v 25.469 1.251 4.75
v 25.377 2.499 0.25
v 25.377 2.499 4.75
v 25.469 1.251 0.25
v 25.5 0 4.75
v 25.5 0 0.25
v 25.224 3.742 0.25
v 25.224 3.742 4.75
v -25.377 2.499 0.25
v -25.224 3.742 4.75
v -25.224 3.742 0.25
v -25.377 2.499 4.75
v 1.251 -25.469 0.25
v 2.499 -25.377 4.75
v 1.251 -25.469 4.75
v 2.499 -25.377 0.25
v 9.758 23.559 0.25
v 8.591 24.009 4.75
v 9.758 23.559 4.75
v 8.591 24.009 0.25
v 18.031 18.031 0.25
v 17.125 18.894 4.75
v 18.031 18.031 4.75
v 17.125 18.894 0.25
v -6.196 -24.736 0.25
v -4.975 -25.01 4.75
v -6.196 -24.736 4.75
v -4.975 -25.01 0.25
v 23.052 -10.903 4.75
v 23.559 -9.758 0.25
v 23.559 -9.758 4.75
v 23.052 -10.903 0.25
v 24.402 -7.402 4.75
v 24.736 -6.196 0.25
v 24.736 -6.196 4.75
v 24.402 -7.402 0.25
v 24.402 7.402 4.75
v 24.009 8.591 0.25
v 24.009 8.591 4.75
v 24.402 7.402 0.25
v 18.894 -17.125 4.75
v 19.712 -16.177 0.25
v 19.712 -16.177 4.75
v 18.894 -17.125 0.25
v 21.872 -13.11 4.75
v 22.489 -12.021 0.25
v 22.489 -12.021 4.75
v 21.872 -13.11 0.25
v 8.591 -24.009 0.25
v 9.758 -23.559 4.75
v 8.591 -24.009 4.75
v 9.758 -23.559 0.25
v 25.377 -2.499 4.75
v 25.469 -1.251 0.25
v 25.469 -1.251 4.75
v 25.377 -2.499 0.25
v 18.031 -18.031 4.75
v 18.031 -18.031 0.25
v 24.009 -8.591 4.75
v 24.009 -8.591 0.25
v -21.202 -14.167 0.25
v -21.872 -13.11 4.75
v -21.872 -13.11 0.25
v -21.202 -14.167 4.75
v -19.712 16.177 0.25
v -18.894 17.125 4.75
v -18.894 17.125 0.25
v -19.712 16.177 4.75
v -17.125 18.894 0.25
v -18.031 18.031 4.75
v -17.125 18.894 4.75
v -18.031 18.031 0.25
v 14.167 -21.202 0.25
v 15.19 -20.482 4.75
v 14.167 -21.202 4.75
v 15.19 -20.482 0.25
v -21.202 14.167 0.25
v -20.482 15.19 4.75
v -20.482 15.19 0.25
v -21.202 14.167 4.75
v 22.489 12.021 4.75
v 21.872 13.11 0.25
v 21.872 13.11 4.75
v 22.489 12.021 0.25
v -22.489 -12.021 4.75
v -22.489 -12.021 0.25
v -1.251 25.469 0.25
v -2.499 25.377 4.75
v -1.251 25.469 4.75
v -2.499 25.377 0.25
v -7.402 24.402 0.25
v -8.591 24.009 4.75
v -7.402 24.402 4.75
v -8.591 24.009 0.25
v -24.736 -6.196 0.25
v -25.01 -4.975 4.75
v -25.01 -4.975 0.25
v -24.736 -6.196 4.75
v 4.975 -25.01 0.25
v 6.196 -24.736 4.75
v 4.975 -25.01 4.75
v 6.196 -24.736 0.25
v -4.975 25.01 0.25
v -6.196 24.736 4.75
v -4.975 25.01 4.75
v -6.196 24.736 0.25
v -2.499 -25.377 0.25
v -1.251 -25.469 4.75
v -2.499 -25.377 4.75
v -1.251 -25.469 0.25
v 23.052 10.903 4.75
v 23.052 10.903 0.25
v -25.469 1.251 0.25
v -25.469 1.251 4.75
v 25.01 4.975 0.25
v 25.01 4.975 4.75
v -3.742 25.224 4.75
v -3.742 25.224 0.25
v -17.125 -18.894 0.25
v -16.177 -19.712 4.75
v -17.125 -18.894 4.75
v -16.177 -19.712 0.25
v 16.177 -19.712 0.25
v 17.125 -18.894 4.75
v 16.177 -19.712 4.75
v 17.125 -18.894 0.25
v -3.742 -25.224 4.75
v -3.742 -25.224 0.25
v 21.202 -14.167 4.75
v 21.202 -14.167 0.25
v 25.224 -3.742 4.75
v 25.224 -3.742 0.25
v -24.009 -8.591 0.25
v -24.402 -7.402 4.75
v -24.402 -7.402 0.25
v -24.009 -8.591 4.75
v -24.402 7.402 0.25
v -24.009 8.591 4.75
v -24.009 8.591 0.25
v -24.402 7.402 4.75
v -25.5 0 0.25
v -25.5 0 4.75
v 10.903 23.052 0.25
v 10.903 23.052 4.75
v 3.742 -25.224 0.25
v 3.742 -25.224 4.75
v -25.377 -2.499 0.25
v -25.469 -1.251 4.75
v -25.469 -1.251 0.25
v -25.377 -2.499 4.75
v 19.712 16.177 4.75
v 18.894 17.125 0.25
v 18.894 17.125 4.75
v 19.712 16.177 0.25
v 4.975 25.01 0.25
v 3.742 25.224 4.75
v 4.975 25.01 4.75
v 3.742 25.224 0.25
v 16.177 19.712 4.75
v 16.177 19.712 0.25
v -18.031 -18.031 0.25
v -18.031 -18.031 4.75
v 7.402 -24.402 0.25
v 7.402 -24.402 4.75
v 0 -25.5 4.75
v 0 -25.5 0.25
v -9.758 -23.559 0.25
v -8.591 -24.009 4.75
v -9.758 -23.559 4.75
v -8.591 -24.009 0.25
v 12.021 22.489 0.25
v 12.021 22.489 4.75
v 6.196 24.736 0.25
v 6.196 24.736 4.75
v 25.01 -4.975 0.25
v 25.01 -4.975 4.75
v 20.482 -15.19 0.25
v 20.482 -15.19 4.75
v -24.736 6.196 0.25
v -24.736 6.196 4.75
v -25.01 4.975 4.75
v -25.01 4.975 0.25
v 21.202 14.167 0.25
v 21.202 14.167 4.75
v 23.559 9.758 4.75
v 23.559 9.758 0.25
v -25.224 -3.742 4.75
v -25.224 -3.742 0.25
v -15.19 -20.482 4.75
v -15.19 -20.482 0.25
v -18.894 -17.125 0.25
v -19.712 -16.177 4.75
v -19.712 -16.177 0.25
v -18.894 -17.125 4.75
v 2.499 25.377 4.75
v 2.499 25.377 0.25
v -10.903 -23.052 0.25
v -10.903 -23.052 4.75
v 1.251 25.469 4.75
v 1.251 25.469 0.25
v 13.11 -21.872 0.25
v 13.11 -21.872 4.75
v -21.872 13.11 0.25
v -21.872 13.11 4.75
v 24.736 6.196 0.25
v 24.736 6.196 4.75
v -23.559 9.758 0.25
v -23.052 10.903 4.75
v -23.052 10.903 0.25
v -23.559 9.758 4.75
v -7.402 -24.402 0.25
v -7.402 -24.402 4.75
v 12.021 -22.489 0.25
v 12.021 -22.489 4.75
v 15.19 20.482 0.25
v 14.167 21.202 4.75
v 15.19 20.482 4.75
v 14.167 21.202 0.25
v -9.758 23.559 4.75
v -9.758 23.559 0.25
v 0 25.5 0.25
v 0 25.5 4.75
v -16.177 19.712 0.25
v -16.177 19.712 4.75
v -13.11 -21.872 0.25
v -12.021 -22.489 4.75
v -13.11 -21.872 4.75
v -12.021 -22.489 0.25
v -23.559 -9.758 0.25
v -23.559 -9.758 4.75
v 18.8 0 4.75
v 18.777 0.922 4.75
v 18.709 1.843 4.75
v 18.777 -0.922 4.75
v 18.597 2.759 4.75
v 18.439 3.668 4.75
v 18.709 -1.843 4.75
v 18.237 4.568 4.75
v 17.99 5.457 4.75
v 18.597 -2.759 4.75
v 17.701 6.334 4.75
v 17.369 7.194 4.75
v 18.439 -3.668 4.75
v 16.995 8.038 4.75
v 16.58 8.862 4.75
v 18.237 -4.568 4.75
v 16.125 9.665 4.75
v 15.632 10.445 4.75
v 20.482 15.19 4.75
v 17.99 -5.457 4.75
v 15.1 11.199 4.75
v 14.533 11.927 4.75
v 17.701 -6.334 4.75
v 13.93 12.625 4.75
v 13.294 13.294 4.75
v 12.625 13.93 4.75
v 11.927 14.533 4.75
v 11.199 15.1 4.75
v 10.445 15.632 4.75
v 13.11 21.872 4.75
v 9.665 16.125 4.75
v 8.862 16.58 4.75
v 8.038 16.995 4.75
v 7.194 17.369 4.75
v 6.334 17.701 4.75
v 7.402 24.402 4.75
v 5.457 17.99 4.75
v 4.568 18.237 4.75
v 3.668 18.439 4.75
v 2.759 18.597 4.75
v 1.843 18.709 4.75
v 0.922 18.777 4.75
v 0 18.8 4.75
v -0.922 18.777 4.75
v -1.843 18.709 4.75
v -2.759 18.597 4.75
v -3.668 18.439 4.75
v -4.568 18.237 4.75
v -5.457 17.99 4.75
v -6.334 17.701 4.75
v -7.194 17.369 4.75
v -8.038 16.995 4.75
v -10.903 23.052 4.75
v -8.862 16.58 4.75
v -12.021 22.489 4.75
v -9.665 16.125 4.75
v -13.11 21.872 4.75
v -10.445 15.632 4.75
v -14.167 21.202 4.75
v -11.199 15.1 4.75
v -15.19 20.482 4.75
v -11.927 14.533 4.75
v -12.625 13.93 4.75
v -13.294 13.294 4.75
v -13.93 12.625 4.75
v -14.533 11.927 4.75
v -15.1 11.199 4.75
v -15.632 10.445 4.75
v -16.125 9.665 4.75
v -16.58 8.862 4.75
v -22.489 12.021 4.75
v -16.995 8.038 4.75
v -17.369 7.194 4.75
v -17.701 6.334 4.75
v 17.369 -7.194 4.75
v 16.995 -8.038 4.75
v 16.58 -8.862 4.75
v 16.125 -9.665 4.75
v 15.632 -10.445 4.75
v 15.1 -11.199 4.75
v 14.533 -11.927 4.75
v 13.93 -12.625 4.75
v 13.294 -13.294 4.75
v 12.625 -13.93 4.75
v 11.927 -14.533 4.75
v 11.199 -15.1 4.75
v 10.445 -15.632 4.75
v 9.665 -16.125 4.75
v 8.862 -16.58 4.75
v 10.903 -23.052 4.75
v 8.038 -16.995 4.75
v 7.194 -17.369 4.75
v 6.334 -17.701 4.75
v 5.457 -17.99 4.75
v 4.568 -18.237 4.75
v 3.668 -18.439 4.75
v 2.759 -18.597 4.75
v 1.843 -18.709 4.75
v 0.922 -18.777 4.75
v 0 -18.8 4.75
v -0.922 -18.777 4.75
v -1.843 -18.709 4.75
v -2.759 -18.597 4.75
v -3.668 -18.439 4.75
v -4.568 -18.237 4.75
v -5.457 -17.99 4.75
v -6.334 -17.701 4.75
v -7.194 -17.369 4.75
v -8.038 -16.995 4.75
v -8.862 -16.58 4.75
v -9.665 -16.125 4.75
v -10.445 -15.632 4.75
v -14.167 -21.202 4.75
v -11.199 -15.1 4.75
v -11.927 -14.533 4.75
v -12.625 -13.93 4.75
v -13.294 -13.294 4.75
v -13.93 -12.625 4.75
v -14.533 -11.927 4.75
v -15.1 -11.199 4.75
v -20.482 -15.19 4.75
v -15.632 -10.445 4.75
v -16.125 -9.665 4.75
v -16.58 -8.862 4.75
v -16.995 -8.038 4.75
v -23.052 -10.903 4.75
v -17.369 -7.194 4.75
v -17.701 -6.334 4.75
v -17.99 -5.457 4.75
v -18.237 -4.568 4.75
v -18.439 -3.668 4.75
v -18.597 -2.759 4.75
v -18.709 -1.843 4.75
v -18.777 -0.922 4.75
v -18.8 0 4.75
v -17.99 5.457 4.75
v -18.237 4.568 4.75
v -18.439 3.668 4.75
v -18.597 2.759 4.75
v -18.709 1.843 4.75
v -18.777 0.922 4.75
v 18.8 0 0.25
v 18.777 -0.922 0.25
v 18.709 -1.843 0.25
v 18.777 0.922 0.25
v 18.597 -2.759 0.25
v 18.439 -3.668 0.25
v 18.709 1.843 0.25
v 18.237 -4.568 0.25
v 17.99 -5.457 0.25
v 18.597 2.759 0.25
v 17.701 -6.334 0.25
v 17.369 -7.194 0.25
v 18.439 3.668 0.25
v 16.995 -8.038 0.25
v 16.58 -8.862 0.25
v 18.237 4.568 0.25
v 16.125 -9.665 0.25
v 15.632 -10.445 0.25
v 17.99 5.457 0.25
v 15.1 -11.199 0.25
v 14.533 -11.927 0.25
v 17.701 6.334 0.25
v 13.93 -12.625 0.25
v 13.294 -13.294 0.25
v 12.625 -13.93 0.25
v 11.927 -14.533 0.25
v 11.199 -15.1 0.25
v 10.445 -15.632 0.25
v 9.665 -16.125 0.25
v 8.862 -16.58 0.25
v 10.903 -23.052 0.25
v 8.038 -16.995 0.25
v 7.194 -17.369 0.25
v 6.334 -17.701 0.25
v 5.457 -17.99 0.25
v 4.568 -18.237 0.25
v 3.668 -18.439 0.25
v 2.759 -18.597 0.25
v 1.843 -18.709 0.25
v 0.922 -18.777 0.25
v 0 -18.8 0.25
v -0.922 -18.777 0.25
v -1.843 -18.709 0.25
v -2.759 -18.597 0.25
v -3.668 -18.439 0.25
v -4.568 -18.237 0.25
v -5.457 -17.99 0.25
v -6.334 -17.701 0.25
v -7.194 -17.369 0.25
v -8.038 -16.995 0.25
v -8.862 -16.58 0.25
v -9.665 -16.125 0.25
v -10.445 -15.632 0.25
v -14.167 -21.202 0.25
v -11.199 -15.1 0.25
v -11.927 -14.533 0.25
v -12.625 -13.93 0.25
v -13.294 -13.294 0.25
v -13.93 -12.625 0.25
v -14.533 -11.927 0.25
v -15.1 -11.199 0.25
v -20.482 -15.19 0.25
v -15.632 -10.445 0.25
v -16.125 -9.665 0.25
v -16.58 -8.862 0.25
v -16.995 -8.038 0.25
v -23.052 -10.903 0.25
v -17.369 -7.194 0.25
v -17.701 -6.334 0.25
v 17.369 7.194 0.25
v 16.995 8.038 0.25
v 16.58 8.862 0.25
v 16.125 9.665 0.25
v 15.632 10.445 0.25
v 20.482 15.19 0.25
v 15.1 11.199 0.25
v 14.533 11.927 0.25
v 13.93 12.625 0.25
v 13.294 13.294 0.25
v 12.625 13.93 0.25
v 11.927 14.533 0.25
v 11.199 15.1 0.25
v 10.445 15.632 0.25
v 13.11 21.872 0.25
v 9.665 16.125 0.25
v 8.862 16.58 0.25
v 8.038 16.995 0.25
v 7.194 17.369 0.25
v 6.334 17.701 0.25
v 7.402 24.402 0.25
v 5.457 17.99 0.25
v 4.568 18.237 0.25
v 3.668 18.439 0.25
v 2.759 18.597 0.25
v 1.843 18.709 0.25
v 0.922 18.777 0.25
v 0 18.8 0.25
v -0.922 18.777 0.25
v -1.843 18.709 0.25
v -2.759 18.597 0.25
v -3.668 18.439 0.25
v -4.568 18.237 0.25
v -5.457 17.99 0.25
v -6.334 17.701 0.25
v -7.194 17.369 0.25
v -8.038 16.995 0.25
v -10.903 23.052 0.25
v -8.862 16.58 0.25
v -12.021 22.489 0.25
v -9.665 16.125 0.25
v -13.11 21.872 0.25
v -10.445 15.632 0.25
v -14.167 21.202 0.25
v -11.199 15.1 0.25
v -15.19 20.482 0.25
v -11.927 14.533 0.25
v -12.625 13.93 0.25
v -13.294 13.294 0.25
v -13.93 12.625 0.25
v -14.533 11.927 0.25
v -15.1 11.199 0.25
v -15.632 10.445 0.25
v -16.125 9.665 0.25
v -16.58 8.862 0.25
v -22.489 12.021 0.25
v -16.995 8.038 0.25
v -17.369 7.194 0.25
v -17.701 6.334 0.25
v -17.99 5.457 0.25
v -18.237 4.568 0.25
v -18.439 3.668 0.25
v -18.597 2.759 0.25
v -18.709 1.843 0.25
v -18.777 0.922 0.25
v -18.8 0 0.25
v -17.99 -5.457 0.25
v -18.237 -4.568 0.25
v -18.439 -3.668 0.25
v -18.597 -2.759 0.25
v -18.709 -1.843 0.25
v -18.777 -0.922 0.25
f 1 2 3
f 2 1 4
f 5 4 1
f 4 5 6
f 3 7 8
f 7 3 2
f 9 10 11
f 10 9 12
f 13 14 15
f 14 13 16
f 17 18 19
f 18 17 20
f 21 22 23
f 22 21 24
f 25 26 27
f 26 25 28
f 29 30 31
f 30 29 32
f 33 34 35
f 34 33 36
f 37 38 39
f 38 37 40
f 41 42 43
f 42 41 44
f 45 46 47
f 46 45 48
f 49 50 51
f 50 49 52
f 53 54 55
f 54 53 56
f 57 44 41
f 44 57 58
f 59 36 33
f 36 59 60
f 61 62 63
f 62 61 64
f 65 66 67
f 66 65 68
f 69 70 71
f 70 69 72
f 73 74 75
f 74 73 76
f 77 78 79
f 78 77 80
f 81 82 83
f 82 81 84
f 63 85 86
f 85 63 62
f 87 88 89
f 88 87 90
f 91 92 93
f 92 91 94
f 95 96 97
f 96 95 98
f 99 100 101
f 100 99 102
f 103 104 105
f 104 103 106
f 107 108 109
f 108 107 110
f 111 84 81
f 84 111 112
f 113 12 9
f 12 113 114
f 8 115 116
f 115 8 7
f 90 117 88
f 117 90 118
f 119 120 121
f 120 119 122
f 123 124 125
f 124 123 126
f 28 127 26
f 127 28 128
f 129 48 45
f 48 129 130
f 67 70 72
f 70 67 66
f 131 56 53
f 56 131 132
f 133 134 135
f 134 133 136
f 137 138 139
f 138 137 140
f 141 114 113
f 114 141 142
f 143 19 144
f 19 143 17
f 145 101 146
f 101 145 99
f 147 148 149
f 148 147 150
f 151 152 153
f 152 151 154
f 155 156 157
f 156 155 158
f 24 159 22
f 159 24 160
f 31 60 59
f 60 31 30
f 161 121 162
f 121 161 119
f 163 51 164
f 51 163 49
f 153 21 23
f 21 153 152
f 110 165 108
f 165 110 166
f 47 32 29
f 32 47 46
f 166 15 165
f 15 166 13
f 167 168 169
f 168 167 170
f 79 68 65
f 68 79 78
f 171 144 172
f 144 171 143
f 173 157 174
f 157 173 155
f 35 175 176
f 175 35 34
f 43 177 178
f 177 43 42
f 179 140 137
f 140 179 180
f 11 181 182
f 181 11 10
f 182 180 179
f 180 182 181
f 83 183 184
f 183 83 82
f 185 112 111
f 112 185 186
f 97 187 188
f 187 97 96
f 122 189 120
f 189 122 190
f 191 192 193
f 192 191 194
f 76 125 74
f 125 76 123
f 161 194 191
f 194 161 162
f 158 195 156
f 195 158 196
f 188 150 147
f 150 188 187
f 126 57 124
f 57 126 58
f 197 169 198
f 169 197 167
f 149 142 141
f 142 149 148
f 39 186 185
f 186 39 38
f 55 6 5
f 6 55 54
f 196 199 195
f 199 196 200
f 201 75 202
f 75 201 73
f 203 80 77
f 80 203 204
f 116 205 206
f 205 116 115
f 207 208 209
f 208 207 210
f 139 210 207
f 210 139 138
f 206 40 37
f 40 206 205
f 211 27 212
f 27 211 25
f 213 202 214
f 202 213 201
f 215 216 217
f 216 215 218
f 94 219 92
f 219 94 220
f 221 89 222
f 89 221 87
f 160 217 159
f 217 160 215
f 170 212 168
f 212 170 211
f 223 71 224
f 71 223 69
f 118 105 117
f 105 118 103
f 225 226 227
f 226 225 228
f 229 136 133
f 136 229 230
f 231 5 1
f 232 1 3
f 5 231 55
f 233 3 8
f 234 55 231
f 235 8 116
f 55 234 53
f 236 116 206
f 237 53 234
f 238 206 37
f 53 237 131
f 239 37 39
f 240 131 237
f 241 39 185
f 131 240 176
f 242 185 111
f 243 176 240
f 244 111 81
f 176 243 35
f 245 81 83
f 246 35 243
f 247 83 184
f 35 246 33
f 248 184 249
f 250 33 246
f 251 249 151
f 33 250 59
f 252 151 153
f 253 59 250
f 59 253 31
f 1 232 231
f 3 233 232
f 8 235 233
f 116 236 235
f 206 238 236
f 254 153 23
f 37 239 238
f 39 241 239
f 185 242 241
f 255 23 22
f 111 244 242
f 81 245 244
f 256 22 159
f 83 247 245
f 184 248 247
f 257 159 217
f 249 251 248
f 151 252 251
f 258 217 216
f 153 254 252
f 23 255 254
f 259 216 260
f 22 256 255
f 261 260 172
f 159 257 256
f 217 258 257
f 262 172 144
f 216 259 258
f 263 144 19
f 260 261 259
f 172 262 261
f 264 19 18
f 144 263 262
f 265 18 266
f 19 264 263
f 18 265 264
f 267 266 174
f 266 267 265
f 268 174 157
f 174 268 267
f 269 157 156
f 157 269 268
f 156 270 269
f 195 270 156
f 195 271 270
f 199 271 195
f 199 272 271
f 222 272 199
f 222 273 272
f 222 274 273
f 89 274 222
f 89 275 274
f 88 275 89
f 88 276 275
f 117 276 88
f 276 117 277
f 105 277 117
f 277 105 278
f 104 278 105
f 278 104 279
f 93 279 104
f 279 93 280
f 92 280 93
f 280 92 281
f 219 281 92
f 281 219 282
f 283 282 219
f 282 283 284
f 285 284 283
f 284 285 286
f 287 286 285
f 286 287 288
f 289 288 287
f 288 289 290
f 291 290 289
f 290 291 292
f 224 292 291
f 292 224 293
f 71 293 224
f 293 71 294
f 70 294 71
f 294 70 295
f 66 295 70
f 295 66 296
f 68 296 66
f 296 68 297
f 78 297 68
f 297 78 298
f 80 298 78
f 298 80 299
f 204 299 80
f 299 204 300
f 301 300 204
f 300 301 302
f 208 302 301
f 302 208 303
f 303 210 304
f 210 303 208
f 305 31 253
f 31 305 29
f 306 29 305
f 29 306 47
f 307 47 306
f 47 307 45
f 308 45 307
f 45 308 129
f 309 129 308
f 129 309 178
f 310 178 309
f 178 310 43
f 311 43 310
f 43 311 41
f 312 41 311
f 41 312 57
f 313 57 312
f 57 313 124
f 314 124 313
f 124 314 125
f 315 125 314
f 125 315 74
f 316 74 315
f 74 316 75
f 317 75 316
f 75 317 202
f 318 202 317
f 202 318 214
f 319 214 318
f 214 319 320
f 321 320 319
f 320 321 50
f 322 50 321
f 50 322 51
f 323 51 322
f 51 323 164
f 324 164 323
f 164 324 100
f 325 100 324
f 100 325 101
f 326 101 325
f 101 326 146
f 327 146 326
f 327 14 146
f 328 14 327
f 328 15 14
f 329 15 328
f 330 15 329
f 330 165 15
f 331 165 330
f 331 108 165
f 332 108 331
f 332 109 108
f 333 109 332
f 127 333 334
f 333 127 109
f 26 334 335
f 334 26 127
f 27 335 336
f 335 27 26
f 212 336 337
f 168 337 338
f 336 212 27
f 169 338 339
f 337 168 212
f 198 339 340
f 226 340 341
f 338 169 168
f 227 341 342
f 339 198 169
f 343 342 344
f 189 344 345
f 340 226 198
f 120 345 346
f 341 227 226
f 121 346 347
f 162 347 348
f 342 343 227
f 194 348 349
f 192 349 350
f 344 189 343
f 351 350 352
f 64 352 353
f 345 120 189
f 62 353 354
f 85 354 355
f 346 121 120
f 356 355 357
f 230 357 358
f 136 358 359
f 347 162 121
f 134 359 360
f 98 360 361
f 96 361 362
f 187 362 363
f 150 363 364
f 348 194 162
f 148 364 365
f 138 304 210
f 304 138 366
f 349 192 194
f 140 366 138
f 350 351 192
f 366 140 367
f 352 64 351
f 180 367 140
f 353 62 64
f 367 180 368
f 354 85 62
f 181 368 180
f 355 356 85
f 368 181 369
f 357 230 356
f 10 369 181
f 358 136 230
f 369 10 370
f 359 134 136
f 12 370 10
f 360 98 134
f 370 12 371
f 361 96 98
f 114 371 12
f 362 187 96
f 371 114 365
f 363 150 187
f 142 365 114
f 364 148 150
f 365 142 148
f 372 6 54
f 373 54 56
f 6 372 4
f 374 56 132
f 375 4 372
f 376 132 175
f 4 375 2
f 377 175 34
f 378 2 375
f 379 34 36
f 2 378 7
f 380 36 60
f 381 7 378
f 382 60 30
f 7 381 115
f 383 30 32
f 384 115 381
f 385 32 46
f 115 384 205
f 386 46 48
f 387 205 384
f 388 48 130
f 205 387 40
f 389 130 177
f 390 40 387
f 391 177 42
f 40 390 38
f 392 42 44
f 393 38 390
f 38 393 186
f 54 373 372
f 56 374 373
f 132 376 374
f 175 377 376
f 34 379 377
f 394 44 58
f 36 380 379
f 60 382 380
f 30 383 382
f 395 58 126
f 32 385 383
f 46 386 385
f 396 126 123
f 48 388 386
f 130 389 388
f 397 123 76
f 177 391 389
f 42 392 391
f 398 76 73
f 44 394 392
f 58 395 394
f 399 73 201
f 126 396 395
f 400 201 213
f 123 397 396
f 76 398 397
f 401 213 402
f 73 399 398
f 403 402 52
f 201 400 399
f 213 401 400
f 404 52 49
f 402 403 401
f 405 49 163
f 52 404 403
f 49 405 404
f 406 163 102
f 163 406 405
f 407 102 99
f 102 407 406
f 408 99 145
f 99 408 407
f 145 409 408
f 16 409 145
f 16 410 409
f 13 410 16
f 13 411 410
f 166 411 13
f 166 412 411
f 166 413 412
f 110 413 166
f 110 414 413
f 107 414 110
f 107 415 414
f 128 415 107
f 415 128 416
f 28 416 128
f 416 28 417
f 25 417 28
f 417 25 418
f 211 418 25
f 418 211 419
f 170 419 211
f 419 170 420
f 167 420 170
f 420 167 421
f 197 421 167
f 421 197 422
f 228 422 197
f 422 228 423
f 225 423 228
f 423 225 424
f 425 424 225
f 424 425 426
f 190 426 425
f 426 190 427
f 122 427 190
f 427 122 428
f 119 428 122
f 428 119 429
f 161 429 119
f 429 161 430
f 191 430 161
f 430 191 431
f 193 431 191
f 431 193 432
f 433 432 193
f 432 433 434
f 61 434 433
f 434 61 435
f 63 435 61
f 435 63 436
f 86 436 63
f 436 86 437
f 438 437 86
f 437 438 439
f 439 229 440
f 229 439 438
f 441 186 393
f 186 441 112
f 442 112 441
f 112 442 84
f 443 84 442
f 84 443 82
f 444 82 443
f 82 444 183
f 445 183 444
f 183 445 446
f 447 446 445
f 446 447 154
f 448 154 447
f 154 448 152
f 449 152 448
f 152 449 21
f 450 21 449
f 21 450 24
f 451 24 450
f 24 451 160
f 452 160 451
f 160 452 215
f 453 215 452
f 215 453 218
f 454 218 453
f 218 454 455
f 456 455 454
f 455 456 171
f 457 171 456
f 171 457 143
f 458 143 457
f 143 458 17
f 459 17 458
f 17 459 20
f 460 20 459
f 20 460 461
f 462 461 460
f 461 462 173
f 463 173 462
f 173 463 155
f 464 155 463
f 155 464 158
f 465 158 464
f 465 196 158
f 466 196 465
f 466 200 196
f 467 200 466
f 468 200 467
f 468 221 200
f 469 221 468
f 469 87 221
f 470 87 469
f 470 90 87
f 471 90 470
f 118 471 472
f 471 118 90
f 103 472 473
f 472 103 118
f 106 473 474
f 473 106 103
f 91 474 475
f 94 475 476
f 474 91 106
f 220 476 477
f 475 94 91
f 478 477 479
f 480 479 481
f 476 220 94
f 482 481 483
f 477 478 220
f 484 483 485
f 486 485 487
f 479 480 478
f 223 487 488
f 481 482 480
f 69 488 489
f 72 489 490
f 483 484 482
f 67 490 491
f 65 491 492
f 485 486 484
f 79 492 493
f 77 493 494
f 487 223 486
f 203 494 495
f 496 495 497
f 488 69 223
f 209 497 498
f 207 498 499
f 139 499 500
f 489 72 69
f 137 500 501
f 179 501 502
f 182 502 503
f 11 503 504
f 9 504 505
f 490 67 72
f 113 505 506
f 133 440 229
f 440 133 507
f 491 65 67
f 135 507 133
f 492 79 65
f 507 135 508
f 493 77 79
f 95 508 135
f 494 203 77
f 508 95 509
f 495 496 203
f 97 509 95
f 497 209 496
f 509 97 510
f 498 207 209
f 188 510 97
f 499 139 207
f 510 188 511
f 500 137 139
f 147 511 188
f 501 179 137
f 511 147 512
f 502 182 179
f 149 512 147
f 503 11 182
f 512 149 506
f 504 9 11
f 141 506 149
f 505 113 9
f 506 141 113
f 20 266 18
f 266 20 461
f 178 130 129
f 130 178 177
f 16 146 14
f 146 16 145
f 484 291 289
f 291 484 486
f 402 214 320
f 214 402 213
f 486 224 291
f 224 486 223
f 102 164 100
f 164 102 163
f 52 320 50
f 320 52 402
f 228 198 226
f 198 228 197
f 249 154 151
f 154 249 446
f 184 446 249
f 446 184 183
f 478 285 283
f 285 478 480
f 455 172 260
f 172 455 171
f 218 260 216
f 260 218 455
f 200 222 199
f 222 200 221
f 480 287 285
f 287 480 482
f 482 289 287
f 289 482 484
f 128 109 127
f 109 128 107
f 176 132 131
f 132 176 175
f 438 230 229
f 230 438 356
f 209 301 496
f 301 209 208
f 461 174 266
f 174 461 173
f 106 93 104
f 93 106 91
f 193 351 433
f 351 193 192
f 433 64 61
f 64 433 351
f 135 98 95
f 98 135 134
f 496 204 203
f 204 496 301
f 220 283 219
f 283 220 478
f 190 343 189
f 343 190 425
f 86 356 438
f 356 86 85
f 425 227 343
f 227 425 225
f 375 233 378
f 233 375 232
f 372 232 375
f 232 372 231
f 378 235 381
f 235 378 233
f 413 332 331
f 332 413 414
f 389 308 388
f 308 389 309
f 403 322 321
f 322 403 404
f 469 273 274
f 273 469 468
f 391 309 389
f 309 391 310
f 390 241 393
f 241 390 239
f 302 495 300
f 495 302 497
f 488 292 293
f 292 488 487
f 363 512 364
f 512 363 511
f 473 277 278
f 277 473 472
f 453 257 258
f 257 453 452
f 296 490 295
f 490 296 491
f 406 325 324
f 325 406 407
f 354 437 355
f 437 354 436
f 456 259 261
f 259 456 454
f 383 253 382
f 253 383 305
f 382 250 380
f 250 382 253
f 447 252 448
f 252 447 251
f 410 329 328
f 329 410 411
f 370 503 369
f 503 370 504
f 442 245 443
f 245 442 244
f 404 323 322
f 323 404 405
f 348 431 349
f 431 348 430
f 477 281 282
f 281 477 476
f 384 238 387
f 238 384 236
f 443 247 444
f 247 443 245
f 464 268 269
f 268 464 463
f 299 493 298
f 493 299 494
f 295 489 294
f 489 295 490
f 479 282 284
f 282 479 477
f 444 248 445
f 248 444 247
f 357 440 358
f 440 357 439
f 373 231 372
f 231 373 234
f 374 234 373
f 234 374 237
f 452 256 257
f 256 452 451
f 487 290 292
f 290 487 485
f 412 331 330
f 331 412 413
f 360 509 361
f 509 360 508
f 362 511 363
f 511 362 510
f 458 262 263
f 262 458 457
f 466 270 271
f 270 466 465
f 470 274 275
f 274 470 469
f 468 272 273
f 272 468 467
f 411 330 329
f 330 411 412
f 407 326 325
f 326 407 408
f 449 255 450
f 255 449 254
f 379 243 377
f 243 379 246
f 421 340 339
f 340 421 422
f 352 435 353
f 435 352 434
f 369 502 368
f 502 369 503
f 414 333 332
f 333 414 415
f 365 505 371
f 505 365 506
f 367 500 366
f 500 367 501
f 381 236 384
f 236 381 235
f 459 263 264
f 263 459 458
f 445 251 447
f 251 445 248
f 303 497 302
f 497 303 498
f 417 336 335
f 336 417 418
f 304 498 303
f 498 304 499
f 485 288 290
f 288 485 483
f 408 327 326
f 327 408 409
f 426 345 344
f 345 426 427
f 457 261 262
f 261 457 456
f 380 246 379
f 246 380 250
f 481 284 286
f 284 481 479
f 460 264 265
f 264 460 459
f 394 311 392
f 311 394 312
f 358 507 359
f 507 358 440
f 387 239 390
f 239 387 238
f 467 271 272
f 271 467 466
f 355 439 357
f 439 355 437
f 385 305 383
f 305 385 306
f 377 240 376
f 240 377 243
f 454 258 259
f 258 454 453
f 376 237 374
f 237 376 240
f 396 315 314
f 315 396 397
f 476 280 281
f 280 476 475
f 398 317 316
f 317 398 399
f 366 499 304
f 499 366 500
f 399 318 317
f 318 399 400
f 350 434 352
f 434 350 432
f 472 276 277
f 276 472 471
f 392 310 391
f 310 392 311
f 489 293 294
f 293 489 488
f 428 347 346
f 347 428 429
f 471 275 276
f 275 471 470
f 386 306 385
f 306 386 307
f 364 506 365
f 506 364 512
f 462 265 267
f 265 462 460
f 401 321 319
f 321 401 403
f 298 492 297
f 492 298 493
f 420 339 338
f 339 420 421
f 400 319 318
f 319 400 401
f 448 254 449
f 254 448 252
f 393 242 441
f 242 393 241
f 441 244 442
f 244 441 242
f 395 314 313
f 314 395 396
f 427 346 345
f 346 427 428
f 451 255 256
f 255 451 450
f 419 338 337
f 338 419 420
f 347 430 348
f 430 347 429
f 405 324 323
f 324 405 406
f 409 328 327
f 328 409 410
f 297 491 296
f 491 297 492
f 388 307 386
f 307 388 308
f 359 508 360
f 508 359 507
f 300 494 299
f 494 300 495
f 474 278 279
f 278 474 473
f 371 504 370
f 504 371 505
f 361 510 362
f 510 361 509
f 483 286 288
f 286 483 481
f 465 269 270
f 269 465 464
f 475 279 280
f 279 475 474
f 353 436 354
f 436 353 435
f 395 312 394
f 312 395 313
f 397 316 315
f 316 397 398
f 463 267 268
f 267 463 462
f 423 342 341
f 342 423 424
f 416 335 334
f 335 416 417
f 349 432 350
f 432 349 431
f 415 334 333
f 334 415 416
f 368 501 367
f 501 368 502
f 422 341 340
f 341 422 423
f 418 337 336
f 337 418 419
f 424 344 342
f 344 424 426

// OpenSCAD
// 30mm holder diam
// 37mm rod_lip
// 65mm max spool size

clearance=.7;

$fn = 128;

module rod() {
    translate([0,0,-.5])
      cylinder(d=30+clearance, h=50);
}

module cone() {
  cylinder(h=5, d=37);
    
translate([0,0,5])
  cylinder(h=15, d1=52, d2=63);
    
translate([0,0,20])
    cylinder(h=5, d=37);
}

module half() {
    translate([0,-32.5,-.5])
    cube([65,65,66]);
}

module spool_half() {
    difference() {
      cone();
      rod();
      half();
  }
}

module lock_ring() {
  difference() {
    translate([0,0,.25])
      cylinder(d=51, h=4.5);
  // minus...
    translate([0,0,0])
      cylinder(h=7, d=37+0.6);
  }
}

//spool_half();
lock_ring();
